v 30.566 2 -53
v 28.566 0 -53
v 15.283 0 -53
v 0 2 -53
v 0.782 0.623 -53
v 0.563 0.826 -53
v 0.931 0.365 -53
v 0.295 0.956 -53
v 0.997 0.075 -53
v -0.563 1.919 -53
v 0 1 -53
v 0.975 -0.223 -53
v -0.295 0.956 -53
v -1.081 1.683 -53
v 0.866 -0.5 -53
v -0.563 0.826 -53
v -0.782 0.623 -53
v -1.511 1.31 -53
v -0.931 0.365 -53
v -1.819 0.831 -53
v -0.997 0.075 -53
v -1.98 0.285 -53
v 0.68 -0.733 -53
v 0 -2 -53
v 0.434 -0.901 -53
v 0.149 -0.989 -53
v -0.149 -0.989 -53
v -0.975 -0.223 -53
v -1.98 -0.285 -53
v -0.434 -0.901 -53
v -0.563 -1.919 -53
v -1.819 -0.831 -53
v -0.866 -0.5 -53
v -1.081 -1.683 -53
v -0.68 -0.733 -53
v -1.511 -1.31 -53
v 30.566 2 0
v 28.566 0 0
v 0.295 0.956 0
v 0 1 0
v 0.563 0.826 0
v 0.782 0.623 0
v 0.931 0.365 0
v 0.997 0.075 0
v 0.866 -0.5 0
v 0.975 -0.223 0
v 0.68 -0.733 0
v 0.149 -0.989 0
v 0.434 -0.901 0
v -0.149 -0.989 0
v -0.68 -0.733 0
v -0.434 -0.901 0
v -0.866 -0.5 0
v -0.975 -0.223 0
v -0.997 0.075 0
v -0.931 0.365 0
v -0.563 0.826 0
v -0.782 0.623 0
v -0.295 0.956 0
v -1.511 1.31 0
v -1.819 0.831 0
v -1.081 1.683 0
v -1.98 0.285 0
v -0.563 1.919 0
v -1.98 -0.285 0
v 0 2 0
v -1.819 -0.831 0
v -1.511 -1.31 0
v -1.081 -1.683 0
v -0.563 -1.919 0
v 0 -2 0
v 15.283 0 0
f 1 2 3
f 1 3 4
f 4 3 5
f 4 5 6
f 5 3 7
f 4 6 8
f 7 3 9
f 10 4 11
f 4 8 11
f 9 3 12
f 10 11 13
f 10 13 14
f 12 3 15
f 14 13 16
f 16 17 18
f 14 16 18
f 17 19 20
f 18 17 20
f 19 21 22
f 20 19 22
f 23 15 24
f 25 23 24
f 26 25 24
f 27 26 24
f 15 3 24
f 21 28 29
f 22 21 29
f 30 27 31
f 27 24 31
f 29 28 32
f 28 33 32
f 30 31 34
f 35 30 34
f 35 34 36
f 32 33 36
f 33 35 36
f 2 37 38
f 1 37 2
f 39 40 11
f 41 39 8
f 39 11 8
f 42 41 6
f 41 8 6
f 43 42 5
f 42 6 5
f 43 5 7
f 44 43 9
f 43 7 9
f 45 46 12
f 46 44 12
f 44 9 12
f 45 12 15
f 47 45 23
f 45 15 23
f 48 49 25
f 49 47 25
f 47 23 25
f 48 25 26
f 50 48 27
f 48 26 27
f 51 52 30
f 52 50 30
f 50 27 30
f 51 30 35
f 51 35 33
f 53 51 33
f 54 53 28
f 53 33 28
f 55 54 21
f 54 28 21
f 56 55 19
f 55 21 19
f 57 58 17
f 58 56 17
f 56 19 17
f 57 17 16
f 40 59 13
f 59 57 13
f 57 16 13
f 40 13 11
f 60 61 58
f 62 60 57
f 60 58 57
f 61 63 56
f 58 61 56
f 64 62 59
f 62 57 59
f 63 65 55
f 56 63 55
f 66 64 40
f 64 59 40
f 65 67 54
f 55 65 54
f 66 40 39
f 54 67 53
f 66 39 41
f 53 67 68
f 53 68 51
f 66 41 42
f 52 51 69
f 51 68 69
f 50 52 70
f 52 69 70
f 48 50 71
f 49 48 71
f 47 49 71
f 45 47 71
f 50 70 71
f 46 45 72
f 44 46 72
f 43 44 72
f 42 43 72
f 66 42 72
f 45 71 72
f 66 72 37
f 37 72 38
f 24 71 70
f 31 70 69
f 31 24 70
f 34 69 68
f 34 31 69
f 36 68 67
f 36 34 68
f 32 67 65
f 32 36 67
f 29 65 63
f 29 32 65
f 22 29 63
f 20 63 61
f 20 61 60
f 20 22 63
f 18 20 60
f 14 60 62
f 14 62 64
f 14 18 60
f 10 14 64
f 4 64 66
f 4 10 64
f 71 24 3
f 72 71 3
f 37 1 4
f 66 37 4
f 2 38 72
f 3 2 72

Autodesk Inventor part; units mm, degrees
ref_plane "YZ Plane" through (0, 0, 0) normal (1, 0, 0) x (0, 1, 0)
ref_plane "XZ Plane" through (0, 0, 0) normal (0, 1, 0) x (-1, 0, 0)
ref_plane "XY Plane" through (0, 0, 0) normal (0, 0, 1) x (1, 0, 0)
sketch "Sketch1" plane through (0, 0, 0) normal (0, 1, 0) x (-1, 0, 0)
  line L0 (0, 0) -> (-30.566, 0)
  line L1 (-30.566, 0) -> (-30.566, -53)
  line L2 (-30.566, -53) -> (0, -53)
  line L3 (0, -53) -> (0, 0)
  dimension "d0" = 30.566
  dimension "d1" = 53
extrude "Extrusion1" add sketch "Sketch1" along normal blind 2
ref_plane "Work Plane1" through (30.566, 0, -23) normal (0, 0, -1) x (-1, 0, 0)
sketch "Sketch2" plane through (30.566, 0, -23) normal (0, 0, -1) x (-1, 0, 0)
  point P0 (30.566, 0)
sketch "Sketch3" plane through (30.566, 0, -53) normal (0, 0, -1) x (-1, 0, 0)
  circle A0 centre (30.566, 0) radius 1
  circle A1 centre (30.566, 0) radius 2
  line L0 (30.566, -2) -> (15.283, 0)
  line L1 (15.283, 0) -> (28.566, 0)
  line L2 (0, 0) -> (30.566, 0) projected
  dimension "d5" = 2
  dimension "d6" = 4
extrude "Extrusion2" add sketch "Sketch3" against normal blind 53 contours A1 L0 | A1 L0 L1 picked at (30.3543, -1.6418)
sketch "Sketch4" plane through (30.566, 0, -53) normal (0, 0, -1) x (-1, 0, 0)
  arc A0 (29.566, 0) -> (30.566, 1) centre (30.566, 0) ccw projected
  circle A1 centre (30.566, 0) radius 1
  point P0 (30.566, 1)
extrude "Extrusion3" cut sketch "Sketch4" against normal blind 53
chamfer "Chamfer2" distance 2 angle 45 1 edges at (30.566, 0, -26.5)
equation "\"BendRadius\" = Thickness"
equation "\"BendReliefWidth\" = Thickness"
equation "\"BendReliefDepth\" = 0.5 * Thickness"
equation "\"CornerReliefSize\" = 4 * Thickness"
equation "\"MinimumRemnant\" = 2 * Thickness"
equation "\"TransitionRadius\" = BendRadius"
equation "\"JacobiRadiusSize\" = BendRadius"
equation "\"GapSize\" = Thickness"
equation "\"Thickness\" = 0.5"
